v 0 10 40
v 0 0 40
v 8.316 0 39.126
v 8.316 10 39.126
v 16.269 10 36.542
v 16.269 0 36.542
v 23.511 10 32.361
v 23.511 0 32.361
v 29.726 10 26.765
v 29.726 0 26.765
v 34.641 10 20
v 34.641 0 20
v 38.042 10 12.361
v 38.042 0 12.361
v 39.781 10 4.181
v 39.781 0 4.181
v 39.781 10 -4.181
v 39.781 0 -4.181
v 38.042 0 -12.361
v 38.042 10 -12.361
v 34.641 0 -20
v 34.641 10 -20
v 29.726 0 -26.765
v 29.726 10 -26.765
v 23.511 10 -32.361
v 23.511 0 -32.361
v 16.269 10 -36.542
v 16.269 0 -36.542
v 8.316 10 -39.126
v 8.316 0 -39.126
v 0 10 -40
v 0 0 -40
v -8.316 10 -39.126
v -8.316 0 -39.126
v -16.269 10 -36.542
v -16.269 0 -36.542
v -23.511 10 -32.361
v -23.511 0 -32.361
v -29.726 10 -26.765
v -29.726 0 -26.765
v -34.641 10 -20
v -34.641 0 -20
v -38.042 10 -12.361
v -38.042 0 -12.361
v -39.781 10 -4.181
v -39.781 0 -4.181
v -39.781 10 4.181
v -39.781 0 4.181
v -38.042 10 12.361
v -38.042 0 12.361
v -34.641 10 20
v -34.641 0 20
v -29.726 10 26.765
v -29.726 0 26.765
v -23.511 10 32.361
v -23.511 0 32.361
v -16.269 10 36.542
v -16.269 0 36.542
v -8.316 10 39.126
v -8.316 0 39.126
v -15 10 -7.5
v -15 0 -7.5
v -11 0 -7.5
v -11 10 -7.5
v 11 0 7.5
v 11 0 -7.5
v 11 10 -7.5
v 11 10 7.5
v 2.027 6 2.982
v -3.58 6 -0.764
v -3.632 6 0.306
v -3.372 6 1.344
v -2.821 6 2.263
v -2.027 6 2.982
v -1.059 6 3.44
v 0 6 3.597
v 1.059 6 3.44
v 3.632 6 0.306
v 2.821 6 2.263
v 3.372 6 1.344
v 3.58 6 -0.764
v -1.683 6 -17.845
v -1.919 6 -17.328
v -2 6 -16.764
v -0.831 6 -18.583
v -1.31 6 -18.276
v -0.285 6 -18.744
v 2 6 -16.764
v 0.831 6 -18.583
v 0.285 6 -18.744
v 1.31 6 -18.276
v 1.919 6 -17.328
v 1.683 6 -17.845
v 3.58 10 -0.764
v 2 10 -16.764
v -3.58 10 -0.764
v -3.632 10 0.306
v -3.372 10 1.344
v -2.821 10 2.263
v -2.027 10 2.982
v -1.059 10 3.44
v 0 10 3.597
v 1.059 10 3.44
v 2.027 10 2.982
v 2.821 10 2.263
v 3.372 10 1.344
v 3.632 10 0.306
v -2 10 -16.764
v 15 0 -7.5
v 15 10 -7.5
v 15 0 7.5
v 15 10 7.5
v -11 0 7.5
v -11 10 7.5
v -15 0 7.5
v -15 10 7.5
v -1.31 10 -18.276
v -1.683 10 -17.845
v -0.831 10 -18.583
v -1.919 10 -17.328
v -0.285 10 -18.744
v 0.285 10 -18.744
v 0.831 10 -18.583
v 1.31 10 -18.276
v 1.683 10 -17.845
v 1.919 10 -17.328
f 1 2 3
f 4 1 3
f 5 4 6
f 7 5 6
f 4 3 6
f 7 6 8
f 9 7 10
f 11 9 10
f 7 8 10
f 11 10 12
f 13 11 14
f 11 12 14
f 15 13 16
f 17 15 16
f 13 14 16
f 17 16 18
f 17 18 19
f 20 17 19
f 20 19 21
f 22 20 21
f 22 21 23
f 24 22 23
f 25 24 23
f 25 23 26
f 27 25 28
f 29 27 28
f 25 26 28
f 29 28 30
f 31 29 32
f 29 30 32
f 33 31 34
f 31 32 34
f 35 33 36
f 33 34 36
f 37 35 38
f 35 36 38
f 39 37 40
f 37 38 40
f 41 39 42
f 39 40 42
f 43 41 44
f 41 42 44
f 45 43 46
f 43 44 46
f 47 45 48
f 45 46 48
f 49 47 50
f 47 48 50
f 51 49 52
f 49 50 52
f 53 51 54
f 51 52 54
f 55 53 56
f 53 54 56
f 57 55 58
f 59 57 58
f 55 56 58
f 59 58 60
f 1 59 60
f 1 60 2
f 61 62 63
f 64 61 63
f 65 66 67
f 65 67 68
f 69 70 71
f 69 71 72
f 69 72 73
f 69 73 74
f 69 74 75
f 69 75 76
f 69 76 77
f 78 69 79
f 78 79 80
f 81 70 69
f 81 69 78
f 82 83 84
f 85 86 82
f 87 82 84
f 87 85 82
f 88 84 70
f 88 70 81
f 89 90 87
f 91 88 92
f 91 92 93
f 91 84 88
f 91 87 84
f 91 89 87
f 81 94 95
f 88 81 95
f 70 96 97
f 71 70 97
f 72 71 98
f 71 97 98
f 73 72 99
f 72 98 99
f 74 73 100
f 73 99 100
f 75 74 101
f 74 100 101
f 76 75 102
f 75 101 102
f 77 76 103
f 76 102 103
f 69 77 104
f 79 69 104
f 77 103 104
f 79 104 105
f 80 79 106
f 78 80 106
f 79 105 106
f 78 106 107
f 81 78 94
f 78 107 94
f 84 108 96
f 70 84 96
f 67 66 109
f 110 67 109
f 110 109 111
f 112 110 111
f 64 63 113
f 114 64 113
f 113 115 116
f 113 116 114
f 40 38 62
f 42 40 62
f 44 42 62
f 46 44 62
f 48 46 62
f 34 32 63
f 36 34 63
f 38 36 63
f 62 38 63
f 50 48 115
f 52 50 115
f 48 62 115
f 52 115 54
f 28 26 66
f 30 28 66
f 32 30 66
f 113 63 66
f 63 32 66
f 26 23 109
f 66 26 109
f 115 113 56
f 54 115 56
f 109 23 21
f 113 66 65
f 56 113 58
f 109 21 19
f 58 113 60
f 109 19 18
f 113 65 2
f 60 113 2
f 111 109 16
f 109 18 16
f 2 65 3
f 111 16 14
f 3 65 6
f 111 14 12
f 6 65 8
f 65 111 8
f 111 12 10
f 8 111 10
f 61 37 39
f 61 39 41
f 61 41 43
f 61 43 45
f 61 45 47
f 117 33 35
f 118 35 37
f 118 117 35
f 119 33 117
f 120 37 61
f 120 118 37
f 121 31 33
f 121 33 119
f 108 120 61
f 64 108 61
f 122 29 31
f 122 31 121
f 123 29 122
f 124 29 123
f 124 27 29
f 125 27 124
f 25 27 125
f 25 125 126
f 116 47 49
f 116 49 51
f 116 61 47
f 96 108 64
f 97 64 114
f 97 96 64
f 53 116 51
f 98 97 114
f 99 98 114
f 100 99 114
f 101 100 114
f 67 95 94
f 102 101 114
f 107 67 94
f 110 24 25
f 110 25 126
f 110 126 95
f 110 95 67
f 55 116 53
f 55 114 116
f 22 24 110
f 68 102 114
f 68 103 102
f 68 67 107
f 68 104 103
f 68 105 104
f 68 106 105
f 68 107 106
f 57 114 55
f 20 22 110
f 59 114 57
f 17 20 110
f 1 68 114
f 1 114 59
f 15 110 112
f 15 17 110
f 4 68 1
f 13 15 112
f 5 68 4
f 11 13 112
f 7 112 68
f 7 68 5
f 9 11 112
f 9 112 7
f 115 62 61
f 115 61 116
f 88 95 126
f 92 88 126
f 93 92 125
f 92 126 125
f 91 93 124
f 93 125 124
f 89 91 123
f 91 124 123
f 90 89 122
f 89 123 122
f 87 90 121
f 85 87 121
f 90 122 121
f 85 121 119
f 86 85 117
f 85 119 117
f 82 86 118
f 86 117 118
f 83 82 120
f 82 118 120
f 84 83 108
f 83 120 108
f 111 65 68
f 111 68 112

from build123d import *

# Parameters (mm, degrees)
SKETCH1_R           = 40
BOSS_EXTRUDE1_DEPTH = 10
CUT_EXTRUDE1_DEPTH  = 4
SKETCH3_W           = 4
SKETCH3_H           = 15
CUT_EXTRUDE2_DEPTH  = 10


with BuildPart() as part:
    # Sketch1 → Boss-Extrude1 (new body)
    with BuildSketch(Plane(origin=(0, 0, 0), x_dir=(1, 0, 0), z_dir=(0, 1, 0))):
        with Locations(Location((0, 0, 0), (0, 0, 270))):
            Circle(SKETCH1_R)
    extrude(amount=BOSS_EXTRUDE1_DEPTH)

    # Sketch2 → Cut-Extrude1 (cut)
    with BuildSketch(Plane(origin=(0, 10, 0), x_dir=(1, 0, 0), z_dir=(0, 1, 0))):
        with BuildLine():
            Line((-2, 16.764144262), (-3.580103784, 0.764144262))
            ThreePointArc((-3.580103784, 0.764144262), (0, -3.596740326), (3.580103784, 0.764144262))
            Line((3.580103784, 0.764144262), (2, 16.764144262))
            ThreePointArc((2, 16.764144262), (0, 18.764144262), (-2, 16.764144262))
        make_face()
    extrude(amount=-CUT_EXTRUDE1_DEPTH, mode=Mode.SUBTRACT)

    # Sketch3 → Cut-Extrude2 (cut)
    with BuildSketch(Plane.XZ):
        with Locations((13, 0)):
            Rectangle(SKETCH3_W, SKETCH3_H)
        with Locations((-13, 0)):
            Rectangle(SKETCH3_W, SKETCH3_H)
    extrude(amount=-CUT_EXTRUDE2_DEPTH, mode=Mode.SUBTRACT)


solid = part.part
